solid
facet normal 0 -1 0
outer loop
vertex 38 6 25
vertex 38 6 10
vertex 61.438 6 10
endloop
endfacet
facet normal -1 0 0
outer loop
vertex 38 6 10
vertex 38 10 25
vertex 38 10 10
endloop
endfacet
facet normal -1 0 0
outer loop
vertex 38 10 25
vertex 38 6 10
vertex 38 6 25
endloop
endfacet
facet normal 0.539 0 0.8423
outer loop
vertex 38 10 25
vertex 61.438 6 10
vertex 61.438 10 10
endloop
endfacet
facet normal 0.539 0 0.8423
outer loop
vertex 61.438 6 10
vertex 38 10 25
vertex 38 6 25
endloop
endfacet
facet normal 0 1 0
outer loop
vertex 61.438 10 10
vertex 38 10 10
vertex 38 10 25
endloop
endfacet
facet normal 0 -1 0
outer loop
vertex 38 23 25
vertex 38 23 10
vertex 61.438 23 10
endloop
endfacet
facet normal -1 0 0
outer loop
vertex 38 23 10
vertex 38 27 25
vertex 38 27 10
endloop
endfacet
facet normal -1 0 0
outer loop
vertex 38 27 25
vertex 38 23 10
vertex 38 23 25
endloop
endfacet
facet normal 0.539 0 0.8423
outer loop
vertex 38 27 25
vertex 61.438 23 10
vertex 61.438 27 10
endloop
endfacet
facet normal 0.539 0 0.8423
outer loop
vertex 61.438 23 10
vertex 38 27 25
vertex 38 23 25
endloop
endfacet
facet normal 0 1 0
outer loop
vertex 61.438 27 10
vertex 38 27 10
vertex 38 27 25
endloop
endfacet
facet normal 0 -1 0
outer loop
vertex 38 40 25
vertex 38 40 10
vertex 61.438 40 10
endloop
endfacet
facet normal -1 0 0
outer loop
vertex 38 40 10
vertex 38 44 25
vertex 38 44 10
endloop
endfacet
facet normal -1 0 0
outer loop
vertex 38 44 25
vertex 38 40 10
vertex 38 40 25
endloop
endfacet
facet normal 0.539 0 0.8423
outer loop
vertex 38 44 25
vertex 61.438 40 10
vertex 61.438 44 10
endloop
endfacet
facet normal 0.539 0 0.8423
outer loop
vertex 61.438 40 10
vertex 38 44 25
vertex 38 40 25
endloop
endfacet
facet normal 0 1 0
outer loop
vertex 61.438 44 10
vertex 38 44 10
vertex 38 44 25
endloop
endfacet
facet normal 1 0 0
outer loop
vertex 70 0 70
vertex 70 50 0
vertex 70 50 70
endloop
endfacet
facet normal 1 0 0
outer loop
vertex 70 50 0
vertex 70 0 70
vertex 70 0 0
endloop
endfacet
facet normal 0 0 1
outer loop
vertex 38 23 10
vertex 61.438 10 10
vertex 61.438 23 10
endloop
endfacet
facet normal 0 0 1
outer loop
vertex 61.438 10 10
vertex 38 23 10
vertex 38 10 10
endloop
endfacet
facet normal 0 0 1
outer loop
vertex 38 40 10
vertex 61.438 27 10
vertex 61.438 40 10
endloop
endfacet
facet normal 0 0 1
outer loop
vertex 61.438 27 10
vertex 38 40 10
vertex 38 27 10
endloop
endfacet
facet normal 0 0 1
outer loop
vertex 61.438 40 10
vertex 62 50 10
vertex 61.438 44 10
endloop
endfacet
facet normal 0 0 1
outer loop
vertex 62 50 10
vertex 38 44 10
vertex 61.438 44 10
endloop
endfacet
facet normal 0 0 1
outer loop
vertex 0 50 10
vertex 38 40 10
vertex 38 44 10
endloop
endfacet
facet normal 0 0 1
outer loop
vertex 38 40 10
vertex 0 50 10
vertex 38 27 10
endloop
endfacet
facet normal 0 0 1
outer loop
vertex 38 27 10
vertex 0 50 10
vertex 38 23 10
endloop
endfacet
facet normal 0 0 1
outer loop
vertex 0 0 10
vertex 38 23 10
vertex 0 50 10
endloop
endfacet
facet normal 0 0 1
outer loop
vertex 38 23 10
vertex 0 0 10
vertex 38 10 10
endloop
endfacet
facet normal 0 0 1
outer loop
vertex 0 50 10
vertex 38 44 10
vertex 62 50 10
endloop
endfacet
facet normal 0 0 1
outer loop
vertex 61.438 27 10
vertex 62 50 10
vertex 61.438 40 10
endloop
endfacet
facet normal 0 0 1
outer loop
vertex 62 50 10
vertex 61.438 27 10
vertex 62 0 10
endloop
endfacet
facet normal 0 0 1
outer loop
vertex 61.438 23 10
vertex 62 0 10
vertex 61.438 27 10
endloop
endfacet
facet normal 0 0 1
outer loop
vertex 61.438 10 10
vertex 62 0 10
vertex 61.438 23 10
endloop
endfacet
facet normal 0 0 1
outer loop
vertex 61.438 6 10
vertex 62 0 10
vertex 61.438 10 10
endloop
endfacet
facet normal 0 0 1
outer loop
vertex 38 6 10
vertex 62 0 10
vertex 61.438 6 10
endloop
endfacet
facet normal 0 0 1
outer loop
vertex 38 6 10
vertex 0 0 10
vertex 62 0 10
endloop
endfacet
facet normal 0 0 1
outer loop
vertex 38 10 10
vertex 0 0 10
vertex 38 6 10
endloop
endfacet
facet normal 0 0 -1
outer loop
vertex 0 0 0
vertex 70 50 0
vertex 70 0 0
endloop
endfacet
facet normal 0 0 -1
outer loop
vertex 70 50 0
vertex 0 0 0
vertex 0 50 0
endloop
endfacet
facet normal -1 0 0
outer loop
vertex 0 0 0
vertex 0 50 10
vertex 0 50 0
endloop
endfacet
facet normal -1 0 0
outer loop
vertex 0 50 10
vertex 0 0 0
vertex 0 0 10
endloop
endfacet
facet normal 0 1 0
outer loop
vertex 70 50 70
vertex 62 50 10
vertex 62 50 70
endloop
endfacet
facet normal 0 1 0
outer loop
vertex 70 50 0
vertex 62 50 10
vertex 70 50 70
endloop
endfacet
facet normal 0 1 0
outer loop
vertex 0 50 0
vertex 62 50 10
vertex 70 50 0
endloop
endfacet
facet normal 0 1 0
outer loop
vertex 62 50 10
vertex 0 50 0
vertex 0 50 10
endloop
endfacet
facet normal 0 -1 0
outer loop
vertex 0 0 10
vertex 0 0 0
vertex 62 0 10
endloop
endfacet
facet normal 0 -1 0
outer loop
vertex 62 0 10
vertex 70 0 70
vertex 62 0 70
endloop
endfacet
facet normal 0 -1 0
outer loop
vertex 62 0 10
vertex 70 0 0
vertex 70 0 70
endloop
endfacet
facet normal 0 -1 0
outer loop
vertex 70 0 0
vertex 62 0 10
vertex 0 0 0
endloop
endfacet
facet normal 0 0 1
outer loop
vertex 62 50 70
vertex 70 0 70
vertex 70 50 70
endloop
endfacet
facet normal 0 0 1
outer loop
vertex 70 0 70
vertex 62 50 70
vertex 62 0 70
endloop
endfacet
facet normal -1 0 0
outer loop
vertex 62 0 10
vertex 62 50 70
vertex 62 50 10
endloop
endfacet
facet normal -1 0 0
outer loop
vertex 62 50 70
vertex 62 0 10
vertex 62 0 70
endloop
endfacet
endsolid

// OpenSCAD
$fn = 32;

// ----------------------------------------------------------------------
// Rib bracket: 3-gusset L bracket
// ----------------------------------------------------------------------

// --- parameters (mm) ---
base_l = 70;              // foot length, X
base_w = 50;              // foot width, Y
base_t = 10;              // foot thickness
plate_t = 8;              // upright plate thickness
plate_h = 70;             // overall height
gus_l = 24;               // gusset leg along the foot
gus_h = 16;               // gusset height
gus_t = 4;                // gusset thickness
gus_edge = 6;             // gusset margin from the foot edge
n_gus = 3;                // gusset count
fit_tol = 0.05;           // tolerance for press fits, mm
free_tol = 0.3;           // tolerance for clearance fits, mm

gus_pitch = (base_w - 2 * gus_edge - gus_t) / (n_gus - 1);  // gusset pitch

union() {
  cube([base_l, base_w, base_t]);
  translate([base_l - plate_t, 0, base_t - 1])
    cube([plate_t, base_w, plate_h - base_t + 1]);
  for (i = [0 : n_gus - 1])
    translate([base_l - plate_t - gus_l, gus_edge + i * gus_pitch, base_t - 1])
      rotate([-90, 0, 0])
        linear_extrude(height = gus_t)
          polygon(points = [[0, 0], [gus_l + 1, 0], [0, -gus_h]]);
}
